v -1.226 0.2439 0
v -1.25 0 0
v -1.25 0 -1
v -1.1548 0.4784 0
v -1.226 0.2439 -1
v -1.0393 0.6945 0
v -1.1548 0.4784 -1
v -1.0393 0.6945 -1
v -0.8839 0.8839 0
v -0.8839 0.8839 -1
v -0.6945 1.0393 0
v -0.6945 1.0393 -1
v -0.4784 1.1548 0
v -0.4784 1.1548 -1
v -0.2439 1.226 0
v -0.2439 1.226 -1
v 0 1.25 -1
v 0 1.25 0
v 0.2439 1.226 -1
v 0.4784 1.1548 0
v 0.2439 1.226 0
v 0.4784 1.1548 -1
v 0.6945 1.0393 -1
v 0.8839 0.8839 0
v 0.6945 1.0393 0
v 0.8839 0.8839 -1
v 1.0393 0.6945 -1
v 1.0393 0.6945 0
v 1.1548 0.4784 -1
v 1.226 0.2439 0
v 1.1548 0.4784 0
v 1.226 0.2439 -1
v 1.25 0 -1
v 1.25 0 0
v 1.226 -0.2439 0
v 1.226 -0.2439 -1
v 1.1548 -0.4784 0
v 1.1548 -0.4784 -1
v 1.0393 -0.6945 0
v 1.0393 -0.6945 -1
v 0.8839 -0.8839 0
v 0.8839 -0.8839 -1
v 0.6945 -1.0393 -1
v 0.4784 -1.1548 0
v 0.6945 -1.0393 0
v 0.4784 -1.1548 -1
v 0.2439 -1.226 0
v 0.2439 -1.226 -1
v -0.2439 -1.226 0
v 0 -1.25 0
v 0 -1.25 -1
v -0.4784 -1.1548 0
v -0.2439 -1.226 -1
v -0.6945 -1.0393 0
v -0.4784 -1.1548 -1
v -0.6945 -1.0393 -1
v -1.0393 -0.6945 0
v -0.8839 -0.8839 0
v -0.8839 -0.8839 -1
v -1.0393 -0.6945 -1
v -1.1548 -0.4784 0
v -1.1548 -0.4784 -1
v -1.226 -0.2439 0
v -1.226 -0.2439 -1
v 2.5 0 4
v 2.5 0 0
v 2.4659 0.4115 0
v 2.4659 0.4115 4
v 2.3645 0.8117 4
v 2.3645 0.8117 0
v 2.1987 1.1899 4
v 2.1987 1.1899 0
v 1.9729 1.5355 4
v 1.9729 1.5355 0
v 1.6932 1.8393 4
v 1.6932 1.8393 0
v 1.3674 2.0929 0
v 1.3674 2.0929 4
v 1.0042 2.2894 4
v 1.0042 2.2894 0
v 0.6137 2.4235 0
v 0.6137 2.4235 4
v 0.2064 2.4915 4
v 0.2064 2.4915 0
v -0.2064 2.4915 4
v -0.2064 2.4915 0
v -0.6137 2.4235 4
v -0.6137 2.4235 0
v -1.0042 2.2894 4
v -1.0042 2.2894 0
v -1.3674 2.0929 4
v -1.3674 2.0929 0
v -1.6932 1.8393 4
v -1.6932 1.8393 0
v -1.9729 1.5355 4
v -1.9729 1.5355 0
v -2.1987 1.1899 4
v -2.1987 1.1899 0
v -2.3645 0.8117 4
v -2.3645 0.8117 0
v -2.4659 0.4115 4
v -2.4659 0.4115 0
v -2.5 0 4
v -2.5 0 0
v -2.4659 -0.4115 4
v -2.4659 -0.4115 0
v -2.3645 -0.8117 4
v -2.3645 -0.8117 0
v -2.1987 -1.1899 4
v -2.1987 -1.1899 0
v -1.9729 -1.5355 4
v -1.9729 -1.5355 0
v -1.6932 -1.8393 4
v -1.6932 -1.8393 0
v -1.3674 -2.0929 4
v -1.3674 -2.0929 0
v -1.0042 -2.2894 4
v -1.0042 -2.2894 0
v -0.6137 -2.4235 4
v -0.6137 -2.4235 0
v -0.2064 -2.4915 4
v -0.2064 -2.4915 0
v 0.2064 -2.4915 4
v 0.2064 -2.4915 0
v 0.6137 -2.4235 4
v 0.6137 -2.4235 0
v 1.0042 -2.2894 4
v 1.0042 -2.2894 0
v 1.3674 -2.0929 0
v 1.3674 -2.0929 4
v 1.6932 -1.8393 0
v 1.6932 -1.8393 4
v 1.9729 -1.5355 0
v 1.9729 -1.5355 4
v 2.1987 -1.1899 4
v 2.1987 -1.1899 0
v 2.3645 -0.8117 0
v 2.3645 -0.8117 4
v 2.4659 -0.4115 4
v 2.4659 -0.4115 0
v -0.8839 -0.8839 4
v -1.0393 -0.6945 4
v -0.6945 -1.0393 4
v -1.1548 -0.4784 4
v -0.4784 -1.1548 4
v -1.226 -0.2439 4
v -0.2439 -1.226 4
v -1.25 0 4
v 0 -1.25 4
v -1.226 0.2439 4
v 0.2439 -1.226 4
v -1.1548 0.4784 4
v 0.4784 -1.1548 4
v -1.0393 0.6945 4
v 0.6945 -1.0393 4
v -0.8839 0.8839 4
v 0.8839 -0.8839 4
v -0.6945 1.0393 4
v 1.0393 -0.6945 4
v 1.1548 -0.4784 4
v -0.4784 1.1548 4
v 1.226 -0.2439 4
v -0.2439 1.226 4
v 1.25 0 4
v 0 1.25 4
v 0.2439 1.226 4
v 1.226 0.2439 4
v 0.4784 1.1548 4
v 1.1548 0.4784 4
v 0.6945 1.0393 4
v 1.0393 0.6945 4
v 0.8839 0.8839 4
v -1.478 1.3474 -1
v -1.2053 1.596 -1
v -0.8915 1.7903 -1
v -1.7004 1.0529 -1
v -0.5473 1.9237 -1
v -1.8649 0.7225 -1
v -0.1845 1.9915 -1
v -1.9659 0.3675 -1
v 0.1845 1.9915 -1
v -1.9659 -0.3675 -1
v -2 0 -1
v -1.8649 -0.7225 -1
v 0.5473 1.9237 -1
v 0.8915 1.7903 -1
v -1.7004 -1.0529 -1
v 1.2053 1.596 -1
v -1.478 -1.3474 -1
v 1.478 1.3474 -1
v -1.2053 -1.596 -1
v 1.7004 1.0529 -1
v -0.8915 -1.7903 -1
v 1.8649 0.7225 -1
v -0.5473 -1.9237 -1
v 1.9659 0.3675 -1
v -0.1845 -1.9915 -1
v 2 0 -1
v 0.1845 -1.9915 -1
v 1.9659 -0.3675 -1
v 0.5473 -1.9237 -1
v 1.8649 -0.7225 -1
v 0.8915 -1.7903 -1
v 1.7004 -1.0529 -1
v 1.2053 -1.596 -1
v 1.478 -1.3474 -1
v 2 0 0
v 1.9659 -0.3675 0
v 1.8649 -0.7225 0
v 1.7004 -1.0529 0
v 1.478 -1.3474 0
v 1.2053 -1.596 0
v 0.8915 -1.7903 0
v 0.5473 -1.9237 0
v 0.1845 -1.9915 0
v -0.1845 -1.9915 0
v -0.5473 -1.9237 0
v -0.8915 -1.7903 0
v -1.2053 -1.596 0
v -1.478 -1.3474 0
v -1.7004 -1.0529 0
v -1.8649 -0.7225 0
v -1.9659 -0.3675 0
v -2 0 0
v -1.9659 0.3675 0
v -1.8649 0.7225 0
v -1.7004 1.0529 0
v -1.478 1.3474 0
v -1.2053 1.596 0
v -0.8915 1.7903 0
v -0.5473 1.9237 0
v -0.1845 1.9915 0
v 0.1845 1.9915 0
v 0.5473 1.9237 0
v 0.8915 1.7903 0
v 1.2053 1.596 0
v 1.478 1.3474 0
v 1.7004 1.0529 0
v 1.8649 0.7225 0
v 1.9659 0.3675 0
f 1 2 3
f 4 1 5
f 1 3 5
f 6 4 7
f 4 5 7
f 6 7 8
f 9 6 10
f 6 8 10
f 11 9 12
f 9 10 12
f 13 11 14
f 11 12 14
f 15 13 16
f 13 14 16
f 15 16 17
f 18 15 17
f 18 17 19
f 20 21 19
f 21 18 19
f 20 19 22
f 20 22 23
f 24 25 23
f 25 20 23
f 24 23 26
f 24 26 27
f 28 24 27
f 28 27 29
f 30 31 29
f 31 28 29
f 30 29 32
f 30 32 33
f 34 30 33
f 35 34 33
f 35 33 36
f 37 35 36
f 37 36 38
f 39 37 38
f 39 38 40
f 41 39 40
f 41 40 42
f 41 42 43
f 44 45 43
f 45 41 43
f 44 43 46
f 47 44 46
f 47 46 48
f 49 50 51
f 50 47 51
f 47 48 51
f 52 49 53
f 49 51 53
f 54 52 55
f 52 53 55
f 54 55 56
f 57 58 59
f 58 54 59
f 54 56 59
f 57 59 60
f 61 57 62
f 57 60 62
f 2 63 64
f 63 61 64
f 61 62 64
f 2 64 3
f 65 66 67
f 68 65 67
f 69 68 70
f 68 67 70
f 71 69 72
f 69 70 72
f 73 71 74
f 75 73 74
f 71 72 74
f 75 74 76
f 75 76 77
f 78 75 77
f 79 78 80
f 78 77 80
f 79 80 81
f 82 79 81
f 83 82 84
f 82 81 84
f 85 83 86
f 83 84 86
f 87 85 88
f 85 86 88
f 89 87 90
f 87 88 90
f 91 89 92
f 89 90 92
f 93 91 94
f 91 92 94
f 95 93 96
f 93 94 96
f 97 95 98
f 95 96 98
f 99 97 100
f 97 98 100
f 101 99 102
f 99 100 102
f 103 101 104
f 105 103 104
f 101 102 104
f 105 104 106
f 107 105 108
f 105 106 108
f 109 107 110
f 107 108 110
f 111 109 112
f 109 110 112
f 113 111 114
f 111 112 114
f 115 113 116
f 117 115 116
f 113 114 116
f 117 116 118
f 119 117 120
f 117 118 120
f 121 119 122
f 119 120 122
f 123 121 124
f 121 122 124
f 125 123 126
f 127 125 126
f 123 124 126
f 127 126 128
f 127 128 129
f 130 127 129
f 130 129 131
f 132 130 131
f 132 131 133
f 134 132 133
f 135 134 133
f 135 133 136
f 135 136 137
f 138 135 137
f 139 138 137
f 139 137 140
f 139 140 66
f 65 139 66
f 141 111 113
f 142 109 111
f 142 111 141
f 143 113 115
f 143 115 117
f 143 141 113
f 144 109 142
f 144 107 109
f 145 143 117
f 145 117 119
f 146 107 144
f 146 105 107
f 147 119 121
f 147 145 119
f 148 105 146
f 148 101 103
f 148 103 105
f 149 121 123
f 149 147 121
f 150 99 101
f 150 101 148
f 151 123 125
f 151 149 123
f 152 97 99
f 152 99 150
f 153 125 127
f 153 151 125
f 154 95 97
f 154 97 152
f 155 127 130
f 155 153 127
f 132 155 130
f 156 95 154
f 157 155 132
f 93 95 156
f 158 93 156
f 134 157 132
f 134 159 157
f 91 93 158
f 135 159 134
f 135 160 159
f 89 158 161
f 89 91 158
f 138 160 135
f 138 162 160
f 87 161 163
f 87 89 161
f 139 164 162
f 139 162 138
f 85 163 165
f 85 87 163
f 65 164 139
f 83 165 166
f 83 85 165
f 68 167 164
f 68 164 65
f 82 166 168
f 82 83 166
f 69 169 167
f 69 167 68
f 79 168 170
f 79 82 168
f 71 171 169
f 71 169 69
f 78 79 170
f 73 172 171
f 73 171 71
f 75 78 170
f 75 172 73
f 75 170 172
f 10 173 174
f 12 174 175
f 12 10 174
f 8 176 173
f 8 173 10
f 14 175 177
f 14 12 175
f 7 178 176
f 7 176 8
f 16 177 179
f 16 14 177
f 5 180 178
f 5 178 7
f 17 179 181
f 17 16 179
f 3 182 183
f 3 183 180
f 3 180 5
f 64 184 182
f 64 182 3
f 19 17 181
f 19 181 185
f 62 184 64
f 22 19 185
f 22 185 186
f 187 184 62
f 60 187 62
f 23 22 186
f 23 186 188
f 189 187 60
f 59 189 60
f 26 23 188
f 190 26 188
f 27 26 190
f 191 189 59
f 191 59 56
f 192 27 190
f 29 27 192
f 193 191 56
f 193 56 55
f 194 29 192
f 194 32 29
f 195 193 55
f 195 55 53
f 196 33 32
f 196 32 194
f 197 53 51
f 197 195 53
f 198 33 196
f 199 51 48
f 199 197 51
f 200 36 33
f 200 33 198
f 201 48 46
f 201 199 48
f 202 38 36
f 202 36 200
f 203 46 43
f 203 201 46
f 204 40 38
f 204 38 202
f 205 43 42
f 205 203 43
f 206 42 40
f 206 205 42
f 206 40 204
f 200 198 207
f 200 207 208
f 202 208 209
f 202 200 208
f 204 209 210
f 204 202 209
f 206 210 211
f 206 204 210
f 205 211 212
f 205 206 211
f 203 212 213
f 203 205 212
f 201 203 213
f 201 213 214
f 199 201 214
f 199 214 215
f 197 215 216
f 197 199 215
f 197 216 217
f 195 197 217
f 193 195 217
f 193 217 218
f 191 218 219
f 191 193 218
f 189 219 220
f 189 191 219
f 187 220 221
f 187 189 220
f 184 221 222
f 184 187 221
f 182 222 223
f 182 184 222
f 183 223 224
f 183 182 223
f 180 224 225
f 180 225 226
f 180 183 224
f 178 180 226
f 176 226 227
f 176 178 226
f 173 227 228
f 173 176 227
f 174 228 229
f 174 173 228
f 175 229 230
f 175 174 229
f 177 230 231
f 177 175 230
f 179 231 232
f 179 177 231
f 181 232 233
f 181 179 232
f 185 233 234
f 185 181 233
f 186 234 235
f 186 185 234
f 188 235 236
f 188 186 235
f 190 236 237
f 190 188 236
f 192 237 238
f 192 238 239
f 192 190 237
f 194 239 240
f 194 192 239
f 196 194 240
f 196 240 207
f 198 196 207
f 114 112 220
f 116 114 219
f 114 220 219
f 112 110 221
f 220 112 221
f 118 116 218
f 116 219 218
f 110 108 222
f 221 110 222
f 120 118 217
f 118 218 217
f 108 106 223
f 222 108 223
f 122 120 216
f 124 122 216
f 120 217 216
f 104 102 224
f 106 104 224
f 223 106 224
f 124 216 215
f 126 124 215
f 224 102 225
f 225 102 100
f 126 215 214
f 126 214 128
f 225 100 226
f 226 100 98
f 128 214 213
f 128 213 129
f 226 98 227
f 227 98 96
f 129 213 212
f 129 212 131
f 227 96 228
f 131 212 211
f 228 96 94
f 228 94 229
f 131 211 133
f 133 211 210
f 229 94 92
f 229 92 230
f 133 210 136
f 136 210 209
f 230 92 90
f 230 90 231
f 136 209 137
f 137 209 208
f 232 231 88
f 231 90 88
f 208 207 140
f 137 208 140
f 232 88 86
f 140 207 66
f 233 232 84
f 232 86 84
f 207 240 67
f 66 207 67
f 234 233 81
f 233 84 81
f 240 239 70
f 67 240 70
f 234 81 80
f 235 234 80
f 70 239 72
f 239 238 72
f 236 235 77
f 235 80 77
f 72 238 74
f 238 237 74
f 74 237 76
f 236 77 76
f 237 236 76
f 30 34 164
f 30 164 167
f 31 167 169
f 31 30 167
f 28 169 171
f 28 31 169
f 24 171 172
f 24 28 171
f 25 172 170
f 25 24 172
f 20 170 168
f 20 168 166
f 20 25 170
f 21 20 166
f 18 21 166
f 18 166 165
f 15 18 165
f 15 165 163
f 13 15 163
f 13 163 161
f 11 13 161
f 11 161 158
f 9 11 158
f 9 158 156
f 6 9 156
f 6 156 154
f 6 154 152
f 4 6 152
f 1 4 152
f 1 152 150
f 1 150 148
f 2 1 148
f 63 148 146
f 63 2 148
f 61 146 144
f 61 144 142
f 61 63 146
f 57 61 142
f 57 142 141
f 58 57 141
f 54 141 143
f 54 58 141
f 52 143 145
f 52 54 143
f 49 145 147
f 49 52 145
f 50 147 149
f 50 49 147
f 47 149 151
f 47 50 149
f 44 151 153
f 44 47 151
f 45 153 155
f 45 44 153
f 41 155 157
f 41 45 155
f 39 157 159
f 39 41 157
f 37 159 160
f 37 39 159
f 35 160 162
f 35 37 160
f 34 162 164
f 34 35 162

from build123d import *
from build123d.topology import SkipClean

# Parameters (mm, degrees)
SKETCH_1_R      = 2.5
SKETCH_1_R_2    = 1.25
EXTRUDE_1_DEPTH = 4
EXTRUDE_START   = 1
SKETCH_2_R      = 2
SKETCH_2_R_2    = 1.25
EXTRUDE_2_DEPTH = 1


with BuildPart() as part:
    # 草图1 → 凸台-拉伸1 (new body)
    with BuildSketch(Plane.XY):
        Circle(SKETCH_1_R)
        Circle(SKETCH_1_R_2, mode=Mode.SUBTRACT)
    extrude(amount=EXTRUDE_1_DEPTH)

    # 草图2 → 凸台-拉伸2 (add)
    with SkipClean():  # the faces are left unmerged after this step: merging them gives an invalid solid
        with BuildSketch(Plane(origin=(0, 0, 0), x_dir=(-1, 0, 0), z_dir=(0, 0, -1)).offset(EXTRUDE_START)):
            with Locations(Location((0, 0, 0), (0, 0, 180))):
                Circle(SKETCH_2_R)
            Circle(SKETCH_2_R_2, mode=Mode.SUBTRACT)
        extrude(amount=-EXTRUDE_2_DEPTH)


solid = part.part
